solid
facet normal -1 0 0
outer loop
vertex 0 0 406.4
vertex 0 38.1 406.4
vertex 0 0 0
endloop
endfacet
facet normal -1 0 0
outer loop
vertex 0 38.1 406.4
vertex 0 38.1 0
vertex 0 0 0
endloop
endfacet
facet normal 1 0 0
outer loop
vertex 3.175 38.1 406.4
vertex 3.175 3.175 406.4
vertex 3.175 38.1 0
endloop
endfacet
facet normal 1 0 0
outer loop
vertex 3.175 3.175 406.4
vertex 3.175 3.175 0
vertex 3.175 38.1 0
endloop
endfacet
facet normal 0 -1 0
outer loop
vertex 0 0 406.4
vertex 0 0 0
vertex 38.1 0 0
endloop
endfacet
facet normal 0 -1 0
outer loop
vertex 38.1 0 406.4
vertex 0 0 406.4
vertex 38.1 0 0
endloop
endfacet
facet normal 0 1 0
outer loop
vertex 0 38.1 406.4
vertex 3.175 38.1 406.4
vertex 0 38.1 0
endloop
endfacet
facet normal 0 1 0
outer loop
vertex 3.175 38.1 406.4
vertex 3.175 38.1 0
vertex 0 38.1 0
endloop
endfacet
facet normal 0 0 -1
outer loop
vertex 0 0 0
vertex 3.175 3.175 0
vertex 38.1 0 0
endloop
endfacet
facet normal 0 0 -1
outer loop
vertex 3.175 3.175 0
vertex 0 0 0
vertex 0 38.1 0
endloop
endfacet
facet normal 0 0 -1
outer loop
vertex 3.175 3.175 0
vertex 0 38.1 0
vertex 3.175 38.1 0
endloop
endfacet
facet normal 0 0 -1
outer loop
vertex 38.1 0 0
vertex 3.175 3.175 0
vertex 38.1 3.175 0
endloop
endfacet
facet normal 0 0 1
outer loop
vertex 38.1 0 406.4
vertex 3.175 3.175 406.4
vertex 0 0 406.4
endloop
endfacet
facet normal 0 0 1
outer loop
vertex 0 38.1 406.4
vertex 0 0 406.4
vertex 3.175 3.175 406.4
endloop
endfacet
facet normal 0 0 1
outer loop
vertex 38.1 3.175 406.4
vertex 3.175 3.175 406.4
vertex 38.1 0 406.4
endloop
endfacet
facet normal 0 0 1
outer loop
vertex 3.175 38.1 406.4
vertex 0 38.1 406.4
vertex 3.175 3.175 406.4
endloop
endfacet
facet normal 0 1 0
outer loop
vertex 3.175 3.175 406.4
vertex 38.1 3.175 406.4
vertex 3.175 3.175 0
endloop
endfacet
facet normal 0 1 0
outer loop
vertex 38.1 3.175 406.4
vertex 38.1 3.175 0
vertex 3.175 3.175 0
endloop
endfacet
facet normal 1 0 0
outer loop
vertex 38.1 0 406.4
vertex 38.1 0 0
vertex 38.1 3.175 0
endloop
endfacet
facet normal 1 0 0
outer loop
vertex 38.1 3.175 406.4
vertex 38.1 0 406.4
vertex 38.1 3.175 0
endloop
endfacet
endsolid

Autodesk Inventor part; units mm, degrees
ref_plane "YZ Plane" through (0, 0, 0) normal (1, 0, 0) x (0, 1, 0)
ref_plane "XZ Plane" through (0, 0, 0) normal (0, 1, 0) x (-1, 0, 0)
ref_plane "XY Plane" through (0, 0, 0) normal (0, 0, 1) x (1, 0, 0)
sketch "Sketch1" plane through (0, 0, 0) normal (0, 0, 1) x (1, 0, 0)
  line L0 (0, 0) -> (38.1, 0)
  line L1 (38.1, 0) -> (38.1, 3.175)
  line L2 (38.1, 3.175) -> (0, 3.175)
  line L3 (0, 3.175) -> (0, 0)
  dimension "d0" = 38.1
  dimension "d1" = 3.175
extrude "Extrusion1" add sketch "Sketch1" along normal blind 355.6
sketch "Sketch2" plane through (0, 0, 355.6) normal (0, 0, 1) x (1, 0, 0)
  line L0 (0, 0) -> (3.175, 0)
  line L1 (3.175, 0) -> (3.175, 38.1)
  line L2 (3.175, 38.1) -> (0, 38.1)
  line L3 (0, 38.1) -> (0, 0)
  dimension "d4" = 3.175
  dimension "d5" = 38.1
extrude "Extrusion2" add sketch "Sketch2" against normal blind 355.6
sketch "Sketch3" plane through (0, 0, 355.6) normal (0, 0, 1) x (1, 0, 0)
  line L0 (0, 0) -> (38.1, 0)
  line L1 (38.1, 0) -> (38.1, 3.175)
  line L2 (38.1, 3.175) -> (3.175, 3.175)
  line L3 (38.1, 3.175) -> (3.175, 3.175) projected
  line L4 (3.175, 3.175) -> (3.175, 38.1)
  line L5 (3.175, 38.1) -> (0, 38.1)
  line L6 (0, 38.1) -> (0, 0)
  line L7 (0, 38.1) -> (0, 0) projected
extrude "Extrusion3" add sketch "Sketch3" along normal blind 50.8
properties part number "16in 2inL"
